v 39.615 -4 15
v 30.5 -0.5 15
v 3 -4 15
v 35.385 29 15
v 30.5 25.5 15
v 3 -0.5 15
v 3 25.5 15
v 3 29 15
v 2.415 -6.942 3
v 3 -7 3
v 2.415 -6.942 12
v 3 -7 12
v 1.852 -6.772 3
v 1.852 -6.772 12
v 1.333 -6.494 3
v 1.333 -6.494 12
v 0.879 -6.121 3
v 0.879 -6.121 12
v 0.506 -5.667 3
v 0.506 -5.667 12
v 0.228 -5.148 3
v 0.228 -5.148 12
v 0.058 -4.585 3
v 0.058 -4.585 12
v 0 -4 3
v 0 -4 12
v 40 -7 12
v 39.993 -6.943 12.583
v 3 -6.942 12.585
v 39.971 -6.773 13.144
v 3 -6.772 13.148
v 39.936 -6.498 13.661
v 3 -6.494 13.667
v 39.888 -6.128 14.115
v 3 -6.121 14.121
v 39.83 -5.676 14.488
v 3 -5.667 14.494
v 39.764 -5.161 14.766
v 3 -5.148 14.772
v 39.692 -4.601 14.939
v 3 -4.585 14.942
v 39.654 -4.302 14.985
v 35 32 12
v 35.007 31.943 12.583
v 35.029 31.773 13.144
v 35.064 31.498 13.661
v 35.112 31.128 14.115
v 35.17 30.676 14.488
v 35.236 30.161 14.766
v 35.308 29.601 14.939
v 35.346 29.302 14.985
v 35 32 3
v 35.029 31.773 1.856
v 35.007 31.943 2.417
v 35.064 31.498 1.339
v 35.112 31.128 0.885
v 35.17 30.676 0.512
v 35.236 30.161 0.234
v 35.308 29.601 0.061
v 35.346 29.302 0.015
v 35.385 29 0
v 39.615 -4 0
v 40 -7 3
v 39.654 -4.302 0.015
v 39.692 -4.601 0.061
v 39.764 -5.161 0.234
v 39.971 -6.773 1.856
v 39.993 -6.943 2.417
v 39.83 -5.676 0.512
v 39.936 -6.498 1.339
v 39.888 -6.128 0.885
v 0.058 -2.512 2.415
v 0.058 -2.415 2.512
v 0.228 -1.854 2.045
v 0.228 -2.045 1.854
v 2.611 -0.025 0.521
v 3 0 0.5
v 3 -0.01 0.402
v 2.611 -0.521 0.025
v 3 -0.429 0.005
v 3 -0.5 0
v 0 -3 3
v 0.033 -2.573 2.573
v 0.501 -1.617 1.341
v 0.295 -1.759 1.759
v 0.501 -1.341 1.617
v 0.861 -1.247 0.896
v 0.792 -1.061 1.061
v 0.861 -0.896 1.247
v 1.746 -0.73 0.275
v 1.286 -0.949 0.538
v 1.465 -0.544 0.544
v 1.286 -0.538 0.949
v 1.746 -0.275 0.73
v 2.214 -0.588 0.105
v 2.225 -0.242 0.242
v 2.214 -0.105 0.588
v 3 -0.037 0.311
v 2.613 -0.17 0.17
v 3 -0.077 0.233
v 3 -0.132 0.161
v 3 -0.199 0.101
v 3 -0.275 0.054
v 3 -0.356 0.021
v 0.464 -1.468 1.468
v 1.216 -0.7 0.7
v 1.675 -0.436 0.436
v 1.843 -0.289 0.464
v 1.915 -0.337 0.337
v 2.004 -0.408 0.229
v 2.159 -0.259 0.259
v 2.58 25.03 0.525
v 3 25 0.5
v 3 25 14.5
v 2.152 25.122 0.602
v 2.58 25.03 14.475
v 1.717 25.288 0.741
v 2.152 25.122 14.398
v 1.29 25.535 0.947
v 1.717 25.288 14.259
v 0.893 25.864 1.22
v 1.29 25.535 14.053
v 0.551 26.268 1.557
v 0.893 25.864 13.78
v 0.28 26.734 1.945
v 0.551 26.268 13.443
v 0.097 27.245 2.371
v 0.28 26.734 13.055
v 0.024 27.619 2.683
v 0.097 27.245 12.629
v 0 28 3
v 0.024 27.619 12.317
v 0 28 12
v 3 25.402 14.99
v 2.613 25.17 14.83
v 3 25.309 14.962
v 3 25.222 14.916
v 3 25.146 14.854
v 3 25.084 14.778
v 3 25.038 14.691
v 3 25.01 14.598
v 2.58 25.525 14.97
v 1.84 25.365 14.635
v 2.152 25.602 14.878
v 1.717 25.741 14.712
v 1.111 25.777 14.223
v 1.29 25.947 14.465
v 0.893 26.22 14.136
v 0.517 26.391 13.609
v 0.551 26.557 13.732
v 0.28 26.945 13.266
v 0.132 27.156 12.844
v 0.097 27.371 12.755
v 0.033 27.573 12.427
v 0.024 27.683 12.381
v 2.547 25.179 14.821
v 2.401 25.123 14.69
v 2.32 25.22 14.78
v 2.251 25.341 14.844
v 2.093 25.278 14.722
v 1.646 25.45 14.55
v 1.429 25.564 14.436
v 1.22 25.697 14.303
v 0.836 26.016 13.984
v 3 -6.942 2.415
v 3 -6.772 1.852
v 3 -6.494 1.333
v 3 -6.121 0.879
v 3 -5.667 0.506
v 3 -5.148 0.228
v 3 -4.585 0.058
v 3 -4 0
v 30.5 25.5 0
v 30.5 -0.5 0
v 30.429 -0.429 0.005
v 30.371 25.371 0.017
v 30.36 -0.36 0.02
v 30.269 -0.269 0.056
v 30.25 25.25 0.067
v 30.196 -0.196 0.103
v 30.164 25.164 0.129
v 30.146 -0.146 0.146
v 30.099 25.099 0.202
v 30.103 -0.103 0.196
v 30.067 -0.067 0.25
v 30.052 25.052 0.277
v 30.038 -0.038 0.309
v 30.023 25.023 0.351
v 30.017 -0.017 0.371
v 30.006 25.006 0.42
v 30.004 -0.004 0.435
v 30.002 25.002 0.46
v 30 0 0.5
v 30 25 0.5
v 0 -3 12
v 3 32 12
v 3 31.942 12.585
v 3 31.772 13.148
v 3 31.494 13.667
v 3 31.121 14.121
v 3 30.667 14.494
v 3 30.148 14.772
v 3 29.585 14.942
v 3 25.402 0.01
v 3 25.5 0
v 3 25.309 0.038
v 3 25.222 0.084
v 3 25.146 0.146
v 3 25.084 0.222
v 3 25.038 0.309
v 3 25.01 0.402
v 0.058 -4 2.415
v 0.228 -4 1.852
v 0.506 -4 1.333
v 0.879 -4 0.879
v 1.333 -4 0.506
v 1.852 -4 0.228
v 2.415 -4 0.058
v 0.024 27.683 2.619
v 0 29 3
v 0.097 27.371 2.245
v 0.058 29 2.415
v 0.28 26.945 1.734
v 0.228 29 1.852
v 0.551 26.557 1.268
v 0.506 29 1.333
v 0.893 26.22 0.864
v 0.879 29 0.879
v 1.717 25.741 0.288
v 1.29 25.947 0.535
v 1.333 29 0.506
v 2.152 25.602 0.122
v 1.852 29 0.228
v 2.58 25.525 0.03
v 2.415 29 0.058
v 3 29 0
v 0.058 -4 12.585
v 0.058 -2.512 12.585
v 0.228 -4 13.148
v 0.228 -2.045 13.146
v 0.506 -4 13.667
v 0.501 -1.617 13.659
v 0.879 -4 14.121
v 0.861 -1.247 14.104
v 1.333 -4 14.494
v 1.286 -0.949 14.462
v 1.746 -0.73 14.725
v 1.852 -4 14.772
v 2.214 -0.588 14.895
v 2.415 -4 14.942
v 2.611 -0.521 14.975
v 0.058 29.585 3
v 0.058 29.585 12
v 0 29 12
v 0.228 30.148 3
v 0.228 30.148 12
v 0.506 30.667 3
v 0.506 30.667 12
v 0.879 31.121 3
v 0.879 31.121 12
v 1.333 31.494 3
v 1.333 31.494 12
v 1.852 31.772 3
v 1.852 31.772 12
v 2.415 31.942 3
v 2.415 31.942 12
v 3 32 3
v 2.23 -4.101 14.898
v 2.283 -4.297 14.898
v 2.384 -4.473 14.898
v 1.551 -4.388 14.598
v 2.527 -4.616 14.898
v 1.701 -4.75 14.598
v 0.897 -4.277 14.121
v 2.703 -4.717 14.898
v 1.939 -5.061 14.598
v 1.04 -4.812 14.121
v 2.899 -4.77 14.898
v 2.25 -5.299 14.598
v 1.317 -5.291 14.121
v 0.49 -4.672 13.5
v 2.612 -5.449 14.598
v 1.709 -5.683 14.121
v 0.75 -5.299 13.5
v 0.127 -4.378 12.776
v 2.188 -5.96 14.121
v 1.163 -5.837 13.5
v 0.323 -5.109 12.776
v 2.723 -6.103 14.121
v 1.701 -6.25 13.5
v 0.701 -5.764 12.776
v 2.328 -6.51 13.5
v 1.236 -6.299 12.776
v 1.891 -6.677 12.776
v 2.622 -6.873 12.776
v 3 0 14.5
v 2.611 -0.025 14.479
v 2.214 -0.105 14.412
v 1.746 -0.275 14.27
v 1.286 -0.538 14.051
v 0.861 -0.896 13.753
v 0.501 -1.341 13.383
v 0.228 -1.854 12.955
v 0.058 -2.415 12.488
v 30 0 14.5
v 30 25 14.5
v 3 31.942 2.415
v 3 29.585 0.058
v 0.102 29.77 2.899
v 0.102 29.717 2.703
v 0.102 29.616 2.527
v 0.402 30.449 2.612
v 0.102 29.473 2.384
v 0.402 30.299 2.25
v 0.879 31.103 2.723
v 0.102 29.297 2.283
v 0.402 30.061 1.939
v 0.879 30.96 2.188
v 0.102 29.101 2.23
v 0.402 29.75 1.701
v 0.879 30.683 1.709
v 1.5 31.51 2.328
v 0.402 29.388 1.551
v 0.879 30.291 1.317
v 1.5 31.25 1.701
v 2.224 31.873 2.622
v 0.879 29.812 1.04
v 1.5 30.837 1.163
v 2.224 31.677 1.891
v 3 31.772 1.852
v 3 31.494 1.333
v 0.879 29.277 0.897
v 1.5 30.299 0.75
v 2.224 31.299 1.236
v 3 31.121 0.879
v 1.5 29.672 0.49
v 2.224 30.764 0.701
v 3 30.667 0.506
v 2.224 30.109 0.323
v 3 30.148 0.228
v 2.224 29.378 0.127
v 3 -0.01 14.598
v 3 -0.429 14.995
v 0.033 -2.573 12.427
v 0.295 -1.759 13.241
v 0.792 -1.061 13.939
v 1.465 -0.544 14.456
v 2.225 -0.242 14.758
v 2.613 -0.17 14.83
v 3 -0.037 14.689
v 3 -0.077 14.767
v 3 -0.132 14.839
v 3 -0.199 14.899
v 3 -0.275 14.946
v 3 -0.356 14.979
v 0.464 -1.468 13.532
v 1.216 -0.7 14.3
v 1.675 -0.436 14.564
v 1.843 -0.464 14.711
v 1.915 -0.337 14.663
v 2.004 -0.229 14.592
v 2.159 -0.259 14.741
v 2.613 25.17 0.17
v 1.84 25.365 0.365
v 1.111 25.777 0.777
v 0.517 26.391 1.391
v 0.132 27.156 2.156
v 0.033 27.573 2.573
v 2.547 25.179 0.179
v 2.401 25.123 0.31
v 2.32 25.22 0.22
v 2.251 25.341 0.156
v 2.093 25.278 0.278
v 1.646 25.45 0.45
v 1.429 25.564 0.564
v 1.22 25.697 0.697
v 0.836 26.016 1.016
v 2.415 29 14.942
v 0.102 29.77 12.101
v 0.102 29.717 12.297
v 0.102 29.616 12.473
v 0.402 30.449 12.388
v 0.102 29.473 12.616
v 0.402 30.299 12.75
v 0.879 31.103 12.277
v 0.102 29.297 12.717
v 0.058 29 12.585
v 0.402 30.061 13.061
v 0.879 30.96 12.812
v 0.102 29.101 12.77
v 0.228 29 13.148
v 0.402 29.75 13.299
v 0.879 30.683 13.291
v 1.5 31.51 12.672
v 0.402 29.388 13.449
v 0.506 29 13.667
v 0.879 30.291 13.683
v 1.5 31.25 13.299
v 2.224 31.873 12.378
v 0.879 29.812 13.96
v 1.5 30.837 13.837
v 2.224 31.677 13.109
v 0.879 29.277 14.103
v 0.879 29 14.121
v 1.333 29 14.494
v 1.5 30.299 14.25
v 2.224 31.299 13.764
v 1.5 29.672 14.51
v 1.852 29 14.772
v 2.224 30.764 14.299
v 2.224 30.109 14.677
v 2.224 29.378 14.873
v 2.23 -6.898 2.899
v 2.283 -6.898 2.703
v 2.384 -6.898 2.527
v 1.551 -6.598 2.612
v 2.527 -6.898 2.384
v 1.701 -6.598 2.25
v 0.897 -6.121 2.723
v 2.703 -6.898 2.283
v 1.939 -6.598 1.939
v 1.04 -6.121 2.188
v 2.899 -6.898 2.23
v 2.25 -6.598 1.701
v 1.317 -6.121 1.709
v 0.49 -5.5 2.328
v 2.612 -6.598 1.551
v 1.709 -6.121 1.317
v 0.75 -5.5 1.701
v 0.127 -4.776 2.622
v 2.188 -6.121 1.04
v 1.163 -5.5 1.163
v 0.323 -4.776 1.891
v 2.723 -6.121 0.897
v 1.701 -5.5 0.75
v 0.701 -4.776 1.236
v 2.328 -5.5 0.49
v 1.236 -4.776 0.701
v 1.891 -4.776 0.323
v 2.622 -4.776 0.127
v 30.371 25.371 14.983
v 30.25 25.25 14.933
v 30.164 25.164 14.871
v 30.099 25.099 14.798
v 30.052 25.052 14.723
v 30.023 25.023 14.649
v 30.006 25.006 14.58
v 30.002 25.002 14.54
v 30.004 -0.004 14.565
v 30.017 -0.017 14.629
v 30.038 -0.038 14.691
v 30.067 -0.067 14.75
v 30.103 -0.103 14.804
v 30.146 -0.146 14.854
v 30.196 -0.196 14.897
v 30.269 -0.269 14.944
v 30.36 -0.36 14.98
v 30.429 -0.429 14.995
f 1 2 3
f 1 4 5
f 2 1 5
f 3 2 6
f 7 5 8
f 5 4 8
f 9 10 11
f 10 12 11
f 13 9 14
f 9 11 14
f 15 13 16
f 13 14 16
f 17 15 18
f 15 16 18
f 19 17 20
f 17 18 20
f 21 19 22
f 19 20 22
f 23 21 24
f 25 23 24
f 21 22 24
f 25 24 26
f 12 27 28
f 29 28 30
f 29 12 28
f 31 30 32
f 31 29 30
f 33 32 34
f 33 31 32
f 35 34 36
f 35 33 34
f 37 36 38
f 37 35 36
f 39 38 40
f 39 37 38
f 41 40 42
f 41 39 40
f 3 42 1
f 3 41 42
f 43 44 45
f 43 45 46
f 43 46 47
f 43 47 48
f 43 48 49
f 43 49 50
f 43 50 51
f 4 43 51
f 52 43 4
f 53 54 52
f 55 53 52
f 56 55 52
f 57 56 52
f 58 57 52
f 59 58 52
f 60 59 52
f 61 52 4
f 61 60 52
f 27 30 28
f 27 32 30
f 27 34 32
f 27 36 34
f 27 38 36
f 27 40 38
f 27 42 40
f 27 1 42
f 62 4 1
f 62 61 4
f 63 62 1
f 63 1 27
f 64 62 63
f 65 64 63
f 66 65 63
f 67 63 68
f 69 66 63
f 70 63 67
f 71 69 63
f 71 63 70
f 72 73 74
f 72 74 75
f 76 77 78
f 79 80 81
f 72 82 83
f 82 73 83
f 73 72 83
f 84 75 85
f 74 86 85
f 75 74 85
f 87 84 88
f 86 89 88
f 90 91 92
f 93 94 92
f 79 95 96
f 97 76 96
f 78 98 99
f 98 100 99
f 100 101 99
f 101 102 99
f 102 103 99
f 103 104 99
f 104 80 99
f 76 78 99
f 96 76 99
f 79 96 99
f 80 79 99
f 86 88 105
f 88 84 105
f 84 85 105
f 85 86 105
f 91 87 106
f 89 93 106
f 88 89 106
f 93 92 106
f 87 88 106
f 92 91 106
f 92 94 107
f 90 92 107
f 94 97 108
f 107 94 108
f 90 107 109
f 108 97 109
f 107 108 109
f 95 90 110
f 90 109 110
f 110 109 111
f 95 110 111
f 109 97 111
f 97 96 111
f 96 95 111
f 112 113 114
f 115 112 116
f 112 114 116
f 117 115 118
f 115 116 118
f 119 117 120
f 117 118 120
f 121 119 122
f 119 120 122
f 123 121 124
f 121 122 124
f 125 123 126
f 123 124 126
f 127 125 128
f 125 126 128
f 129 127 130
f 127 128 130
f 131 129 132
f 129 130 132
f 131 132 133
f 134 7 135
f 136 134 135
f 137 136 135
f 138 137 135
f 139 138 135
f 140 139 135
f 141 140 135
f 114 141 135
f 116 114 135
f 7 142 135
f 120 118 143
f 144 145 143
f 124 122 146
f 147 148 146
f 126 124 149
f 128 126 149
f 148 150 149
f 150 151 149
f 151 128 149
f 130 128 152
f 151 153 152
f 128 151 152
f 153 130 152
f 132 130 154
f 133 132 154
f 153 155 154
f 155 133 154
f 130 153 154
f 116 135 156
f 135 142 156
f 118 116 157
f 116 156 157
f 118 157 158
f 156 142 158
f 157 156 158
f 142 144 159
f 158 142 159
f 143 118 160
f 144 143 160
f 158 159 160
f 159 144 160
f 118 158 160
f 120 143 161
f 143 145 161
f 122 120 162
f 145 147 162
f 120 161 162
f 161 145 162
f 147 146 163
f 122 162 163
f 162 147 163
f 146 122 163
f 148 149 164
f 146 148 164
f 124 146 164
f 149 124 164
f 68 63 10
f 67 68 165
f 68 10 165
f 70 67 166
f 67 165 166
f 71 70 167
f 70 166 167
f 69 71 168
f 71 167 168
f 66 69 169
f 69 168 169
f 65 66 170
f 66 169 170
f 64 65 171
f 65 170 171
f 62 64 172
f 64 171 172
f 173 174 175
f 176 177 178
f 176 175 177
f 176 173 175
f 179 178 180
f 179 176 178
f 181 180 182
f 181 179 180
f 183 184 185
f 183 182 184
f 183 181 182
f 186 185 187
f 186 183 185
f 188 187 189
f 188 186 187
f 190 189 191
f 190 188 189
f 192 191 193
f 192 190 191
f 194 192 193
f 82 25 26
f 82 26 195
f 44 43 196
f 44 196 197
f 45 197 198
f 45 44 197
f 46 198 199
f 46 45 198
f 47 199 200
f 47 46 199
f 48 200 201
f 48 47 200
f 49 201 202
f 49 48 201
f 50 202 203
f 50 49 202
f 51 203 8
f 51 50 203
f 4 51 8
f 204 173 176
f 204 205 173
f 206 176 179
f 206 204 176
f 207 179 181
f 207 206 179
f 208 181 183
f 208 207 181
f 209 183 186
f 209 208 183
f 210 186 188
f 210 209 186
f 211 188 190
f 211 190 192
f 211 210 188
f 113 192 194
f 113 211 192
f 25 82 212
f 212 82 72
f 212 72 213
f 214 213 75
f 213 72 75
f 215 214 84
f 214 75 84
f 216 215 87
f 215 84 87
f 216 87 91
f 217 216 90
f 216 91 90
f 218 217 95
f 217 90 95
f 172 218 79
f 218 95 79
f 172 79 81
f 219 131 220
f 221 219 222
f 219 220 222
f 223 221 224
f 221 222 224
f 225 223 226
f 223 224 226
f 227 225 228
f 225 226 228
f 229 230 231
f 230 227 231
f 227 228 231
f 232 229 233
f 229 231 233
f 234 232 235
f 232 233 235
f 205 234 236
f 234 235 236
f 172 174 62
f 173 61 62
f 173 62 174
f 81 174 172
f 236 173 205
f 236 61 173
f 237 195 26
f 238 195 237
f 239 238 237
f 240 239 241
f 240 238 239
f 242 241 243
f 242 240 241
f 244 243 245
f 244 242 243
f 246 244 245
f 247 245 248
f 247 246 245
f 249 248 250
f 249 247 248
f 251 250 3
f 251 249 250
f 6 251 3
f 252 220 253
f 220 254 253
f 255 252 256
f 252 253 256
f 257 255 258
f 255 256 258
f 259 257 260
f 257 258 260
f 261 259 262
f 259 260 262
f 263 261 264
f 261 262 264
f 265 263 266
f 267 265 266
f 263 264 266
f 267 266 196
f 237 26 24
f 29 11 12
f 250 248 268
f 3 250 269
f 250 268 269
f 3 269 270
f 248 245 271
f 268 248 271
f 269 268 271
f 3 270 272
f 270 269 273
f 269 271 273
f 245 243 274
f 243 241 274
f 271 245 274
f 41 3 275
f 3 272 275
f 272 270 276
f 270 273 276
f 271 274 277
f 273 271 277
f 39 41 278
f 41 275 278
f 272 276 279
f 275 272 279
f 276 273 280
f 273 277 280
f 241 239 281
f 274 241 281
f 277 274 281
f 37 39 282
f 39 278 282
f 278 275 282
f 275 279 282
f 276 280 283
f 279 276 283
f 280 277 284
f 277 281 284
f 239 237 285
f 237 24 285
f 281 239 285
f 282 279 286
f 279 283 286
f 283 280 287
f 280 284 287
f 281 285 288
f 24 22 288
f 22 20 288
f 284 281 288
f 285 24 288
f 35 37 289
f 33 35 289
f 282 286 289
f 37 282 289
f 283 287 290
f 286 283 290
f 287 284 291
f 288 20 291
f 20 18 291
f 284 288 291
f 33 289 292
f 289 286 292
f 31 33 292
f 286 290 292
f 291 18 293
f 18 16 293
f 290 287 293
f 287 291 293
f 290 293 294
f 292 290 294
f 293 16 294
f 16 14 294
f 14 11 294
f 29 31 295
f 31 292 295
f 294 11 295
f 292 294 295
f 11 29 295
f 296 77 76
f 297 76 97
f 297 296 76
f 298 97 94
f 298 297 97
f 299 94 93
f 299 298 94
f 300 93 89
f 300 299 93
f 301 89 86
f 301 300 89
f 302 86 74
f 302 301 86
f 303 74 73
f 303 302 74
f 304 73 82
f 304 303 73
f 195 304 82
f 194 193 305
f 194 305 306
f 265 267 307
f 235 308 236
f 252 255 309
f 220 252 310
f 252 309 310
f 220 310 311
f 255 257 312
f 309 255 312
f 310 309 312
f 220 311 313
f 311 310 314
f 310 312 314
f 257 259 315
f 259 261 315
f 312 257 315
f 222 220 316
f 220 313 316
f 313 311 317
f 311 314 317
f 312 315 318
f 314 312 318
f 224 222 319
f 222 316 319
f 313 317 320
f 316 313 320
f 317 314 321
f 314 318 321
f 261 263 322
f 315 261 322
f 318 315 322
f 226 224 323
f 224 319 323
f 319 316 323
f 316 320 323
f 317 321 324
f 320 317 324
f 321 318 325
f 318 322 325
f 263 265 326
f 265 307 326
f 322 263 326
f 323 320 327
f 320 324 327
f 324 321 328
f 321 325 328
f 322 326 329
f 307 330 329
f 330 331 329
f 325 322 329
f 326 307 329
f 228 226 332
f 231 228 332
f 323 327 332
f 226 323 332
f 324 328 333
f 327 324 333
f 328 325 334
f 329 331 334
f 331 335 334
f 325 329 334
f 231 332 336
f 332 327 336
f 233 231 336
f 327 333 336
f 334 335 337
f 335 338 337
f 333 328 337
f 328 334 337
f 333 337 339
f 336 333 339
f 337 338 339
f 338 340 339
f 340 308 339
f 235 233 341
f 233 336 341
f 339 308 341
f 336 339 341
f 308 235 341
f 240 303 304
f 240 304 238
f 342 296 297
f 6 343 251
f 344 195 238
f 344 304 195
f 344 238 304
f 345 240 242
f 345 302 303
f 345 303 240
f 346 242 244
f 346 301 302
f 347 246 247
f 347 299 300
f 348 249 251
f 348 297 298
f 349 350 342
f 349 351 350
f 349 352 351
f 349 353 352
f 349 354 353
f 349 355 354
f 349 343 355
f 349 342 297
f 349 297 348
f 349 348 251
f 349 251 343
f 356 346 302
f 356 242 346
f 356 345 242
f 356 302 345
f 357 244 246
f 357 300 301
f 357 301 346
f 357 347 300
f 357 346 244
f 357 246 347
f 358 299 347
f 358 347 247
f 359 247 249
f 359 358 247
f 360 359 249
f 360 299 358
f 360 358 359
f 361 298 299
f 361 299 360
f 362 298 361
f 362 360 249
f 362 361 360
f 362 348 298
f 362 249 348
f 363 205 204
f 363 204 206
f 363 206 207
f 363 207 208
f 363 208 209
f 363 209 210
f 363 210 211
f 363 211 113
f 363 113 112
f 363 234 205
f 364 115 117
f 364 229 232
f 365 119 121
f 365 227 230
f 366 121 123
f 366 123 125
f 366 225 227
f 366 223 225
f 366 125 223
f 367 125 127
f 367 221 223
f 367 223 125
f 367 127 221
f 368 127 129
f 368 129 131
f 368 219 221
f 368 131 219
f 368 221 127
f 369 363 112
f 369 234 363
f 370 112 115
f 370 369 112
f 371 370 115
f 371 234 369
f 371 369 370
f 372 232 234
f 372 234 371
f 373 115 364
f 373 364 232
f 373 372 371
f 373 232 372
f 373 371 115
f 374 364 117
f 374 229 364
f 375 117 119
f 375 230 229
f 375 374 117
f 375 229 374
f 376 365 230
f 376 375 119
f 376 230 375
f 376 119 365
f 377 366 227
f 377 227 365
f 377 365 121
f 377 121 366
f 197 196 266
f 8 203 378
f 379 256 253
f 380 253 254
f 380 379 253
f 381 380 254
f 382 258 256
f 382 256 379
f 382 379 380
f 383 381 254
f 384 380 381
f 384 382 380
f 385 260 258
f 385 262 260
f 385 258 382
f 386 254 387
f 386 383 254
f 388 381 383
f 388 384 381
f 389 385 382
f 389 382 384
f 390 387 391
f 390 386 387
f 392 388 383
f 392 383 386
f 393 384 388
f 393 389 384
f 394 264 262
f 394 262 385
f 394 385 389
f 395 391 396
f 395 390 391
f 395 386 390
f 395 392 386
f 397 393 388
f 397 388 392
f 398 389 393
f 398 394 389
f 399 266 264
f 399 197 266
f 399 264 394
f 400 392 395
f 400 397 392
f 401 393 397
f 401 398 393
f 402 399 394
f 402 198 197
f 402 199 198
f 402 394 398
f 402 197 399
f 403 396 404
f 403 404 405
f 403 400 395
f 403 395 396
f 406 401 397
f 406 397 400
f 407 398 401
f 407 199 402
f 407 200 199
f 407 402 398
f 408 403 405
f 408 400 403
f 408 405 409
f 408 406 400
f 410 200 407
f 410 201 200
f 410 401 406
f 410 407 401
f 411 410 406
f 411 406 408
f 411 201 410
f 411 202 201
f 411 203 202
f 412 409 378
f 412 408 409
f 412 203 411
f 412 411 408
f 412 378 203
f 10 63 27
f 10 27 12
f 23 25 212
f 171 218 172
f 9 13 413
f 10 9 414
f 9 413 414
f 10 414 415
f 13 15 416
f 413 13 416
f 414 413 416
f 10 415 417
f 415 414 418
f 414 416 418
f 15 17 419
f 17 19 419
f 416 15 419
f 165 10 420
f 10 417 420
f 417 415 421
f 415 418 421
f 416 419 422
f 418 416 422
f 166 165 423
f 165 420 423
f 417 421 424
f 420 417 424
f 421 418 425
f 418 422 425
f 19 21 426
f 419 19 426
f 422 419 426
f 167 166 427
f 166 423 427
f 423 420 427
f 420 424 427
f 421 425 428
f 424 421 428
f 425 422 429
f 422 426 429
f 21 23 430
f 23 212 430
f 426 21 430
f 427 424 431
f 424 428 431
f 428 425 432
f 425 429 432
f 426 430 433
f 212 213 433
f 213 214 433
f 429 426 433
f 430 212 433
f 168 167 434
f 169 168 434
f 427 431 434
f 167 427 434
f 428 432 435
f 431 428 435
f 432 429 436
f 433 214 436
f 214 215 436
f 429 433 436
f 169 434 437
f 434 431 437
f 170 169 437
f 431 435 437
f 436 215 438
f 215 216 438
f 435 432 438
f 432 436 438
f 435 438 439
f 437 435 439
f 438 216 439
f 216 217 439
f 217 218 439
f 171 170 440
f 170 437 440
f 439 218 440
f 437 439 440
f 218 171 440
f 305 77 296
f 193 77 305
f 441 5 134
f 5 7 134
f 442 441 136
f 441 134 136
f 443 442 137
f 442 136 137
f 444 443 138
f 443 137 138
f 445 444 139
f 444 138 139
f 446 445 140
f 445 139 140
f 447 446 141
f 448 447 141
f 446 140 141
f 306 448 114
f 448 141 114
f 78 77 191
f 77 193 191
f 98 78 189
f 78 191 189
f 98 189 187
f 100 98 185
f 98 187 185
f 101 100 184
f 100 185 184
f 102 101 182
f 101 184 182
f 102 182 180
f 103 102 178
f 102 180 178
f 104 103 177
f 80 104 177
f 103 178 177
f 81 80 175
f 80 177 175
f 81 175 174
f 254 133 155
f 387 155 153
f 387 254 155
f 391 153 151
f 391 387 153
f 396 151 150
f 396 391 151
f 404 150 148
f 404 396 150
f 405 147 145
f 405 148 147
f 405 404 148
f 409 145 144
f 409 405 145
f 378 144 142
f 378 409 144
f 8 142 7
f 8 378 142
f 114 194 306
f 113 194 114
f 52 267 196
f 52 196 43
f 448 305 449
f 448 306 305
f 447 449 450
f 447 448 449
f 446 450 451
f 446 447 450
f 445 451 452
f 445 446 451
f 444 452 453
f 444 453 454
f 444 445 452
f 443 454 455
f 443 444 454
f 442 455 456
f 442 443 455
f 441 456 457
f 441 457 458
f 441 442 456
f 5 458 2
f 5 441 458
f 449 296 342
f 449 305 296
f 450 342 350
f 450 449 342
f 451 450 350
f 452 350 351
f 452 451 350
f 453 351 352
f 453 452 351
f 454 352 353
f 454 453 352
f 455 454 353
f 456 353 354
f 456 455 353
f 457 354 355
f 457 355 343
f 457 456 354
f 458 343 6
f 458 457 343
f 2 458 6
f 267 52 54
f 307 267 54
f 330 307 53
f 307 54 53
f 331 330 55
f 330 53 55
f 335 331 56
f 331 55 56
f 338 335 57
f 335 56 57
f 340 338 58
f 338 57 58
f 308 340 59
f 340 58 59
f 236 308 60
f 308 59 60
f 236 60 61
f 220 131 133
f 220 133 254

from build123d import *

# Parameters (mm, degrees)
PAD_DEPTH   = 15
FILLET_R    = 3
FILLET001_R = 0.5


with BuildPart() as part:
    # Sketch → Pad (new body)
    with BuildSketch(Plane.XY):
        Polygon((0, 0), (30, 0), (30, 25), (0, 25), (0, 32), (35, 32), (40, -7), (0, -7), align=None)
    extrude(amount=PAD_DEPTH)

    # Fillet
    fillet_edges = [part.edges().sort_by_distance(p)[0] for p in [
        (17.5, 32, 15),
        (17.5, 32, 0),
        (0, 32, 7.5),
        (0, 25, 7.5),
        (0, 28.5, 0),
        (0, 28.5, 15),
        (0, 0, 7.5),
        (0, -3.5, 0),
        (0, -7, 7.5),
        (0, -3.5, 15),
        (20, -7, 15),
        (20, -7, 0),
    ]]
    fillet(fillet_edges, radius=FILLET_R)

    # Fillet001
    fillet001_edges = [part.edges().sort_by_distance(p)[0] for p in [
        (16.5, 0, 15),
        (16.5, 0, 0),
        (16.5, 25, 0),
        (16.5, 25, 15),
        (30, 12.5, 0),
        (30, 12.5, 15),
    ]]
    fillet(fillet001_edges, radius=FILLET001_R)


solid = part.part
